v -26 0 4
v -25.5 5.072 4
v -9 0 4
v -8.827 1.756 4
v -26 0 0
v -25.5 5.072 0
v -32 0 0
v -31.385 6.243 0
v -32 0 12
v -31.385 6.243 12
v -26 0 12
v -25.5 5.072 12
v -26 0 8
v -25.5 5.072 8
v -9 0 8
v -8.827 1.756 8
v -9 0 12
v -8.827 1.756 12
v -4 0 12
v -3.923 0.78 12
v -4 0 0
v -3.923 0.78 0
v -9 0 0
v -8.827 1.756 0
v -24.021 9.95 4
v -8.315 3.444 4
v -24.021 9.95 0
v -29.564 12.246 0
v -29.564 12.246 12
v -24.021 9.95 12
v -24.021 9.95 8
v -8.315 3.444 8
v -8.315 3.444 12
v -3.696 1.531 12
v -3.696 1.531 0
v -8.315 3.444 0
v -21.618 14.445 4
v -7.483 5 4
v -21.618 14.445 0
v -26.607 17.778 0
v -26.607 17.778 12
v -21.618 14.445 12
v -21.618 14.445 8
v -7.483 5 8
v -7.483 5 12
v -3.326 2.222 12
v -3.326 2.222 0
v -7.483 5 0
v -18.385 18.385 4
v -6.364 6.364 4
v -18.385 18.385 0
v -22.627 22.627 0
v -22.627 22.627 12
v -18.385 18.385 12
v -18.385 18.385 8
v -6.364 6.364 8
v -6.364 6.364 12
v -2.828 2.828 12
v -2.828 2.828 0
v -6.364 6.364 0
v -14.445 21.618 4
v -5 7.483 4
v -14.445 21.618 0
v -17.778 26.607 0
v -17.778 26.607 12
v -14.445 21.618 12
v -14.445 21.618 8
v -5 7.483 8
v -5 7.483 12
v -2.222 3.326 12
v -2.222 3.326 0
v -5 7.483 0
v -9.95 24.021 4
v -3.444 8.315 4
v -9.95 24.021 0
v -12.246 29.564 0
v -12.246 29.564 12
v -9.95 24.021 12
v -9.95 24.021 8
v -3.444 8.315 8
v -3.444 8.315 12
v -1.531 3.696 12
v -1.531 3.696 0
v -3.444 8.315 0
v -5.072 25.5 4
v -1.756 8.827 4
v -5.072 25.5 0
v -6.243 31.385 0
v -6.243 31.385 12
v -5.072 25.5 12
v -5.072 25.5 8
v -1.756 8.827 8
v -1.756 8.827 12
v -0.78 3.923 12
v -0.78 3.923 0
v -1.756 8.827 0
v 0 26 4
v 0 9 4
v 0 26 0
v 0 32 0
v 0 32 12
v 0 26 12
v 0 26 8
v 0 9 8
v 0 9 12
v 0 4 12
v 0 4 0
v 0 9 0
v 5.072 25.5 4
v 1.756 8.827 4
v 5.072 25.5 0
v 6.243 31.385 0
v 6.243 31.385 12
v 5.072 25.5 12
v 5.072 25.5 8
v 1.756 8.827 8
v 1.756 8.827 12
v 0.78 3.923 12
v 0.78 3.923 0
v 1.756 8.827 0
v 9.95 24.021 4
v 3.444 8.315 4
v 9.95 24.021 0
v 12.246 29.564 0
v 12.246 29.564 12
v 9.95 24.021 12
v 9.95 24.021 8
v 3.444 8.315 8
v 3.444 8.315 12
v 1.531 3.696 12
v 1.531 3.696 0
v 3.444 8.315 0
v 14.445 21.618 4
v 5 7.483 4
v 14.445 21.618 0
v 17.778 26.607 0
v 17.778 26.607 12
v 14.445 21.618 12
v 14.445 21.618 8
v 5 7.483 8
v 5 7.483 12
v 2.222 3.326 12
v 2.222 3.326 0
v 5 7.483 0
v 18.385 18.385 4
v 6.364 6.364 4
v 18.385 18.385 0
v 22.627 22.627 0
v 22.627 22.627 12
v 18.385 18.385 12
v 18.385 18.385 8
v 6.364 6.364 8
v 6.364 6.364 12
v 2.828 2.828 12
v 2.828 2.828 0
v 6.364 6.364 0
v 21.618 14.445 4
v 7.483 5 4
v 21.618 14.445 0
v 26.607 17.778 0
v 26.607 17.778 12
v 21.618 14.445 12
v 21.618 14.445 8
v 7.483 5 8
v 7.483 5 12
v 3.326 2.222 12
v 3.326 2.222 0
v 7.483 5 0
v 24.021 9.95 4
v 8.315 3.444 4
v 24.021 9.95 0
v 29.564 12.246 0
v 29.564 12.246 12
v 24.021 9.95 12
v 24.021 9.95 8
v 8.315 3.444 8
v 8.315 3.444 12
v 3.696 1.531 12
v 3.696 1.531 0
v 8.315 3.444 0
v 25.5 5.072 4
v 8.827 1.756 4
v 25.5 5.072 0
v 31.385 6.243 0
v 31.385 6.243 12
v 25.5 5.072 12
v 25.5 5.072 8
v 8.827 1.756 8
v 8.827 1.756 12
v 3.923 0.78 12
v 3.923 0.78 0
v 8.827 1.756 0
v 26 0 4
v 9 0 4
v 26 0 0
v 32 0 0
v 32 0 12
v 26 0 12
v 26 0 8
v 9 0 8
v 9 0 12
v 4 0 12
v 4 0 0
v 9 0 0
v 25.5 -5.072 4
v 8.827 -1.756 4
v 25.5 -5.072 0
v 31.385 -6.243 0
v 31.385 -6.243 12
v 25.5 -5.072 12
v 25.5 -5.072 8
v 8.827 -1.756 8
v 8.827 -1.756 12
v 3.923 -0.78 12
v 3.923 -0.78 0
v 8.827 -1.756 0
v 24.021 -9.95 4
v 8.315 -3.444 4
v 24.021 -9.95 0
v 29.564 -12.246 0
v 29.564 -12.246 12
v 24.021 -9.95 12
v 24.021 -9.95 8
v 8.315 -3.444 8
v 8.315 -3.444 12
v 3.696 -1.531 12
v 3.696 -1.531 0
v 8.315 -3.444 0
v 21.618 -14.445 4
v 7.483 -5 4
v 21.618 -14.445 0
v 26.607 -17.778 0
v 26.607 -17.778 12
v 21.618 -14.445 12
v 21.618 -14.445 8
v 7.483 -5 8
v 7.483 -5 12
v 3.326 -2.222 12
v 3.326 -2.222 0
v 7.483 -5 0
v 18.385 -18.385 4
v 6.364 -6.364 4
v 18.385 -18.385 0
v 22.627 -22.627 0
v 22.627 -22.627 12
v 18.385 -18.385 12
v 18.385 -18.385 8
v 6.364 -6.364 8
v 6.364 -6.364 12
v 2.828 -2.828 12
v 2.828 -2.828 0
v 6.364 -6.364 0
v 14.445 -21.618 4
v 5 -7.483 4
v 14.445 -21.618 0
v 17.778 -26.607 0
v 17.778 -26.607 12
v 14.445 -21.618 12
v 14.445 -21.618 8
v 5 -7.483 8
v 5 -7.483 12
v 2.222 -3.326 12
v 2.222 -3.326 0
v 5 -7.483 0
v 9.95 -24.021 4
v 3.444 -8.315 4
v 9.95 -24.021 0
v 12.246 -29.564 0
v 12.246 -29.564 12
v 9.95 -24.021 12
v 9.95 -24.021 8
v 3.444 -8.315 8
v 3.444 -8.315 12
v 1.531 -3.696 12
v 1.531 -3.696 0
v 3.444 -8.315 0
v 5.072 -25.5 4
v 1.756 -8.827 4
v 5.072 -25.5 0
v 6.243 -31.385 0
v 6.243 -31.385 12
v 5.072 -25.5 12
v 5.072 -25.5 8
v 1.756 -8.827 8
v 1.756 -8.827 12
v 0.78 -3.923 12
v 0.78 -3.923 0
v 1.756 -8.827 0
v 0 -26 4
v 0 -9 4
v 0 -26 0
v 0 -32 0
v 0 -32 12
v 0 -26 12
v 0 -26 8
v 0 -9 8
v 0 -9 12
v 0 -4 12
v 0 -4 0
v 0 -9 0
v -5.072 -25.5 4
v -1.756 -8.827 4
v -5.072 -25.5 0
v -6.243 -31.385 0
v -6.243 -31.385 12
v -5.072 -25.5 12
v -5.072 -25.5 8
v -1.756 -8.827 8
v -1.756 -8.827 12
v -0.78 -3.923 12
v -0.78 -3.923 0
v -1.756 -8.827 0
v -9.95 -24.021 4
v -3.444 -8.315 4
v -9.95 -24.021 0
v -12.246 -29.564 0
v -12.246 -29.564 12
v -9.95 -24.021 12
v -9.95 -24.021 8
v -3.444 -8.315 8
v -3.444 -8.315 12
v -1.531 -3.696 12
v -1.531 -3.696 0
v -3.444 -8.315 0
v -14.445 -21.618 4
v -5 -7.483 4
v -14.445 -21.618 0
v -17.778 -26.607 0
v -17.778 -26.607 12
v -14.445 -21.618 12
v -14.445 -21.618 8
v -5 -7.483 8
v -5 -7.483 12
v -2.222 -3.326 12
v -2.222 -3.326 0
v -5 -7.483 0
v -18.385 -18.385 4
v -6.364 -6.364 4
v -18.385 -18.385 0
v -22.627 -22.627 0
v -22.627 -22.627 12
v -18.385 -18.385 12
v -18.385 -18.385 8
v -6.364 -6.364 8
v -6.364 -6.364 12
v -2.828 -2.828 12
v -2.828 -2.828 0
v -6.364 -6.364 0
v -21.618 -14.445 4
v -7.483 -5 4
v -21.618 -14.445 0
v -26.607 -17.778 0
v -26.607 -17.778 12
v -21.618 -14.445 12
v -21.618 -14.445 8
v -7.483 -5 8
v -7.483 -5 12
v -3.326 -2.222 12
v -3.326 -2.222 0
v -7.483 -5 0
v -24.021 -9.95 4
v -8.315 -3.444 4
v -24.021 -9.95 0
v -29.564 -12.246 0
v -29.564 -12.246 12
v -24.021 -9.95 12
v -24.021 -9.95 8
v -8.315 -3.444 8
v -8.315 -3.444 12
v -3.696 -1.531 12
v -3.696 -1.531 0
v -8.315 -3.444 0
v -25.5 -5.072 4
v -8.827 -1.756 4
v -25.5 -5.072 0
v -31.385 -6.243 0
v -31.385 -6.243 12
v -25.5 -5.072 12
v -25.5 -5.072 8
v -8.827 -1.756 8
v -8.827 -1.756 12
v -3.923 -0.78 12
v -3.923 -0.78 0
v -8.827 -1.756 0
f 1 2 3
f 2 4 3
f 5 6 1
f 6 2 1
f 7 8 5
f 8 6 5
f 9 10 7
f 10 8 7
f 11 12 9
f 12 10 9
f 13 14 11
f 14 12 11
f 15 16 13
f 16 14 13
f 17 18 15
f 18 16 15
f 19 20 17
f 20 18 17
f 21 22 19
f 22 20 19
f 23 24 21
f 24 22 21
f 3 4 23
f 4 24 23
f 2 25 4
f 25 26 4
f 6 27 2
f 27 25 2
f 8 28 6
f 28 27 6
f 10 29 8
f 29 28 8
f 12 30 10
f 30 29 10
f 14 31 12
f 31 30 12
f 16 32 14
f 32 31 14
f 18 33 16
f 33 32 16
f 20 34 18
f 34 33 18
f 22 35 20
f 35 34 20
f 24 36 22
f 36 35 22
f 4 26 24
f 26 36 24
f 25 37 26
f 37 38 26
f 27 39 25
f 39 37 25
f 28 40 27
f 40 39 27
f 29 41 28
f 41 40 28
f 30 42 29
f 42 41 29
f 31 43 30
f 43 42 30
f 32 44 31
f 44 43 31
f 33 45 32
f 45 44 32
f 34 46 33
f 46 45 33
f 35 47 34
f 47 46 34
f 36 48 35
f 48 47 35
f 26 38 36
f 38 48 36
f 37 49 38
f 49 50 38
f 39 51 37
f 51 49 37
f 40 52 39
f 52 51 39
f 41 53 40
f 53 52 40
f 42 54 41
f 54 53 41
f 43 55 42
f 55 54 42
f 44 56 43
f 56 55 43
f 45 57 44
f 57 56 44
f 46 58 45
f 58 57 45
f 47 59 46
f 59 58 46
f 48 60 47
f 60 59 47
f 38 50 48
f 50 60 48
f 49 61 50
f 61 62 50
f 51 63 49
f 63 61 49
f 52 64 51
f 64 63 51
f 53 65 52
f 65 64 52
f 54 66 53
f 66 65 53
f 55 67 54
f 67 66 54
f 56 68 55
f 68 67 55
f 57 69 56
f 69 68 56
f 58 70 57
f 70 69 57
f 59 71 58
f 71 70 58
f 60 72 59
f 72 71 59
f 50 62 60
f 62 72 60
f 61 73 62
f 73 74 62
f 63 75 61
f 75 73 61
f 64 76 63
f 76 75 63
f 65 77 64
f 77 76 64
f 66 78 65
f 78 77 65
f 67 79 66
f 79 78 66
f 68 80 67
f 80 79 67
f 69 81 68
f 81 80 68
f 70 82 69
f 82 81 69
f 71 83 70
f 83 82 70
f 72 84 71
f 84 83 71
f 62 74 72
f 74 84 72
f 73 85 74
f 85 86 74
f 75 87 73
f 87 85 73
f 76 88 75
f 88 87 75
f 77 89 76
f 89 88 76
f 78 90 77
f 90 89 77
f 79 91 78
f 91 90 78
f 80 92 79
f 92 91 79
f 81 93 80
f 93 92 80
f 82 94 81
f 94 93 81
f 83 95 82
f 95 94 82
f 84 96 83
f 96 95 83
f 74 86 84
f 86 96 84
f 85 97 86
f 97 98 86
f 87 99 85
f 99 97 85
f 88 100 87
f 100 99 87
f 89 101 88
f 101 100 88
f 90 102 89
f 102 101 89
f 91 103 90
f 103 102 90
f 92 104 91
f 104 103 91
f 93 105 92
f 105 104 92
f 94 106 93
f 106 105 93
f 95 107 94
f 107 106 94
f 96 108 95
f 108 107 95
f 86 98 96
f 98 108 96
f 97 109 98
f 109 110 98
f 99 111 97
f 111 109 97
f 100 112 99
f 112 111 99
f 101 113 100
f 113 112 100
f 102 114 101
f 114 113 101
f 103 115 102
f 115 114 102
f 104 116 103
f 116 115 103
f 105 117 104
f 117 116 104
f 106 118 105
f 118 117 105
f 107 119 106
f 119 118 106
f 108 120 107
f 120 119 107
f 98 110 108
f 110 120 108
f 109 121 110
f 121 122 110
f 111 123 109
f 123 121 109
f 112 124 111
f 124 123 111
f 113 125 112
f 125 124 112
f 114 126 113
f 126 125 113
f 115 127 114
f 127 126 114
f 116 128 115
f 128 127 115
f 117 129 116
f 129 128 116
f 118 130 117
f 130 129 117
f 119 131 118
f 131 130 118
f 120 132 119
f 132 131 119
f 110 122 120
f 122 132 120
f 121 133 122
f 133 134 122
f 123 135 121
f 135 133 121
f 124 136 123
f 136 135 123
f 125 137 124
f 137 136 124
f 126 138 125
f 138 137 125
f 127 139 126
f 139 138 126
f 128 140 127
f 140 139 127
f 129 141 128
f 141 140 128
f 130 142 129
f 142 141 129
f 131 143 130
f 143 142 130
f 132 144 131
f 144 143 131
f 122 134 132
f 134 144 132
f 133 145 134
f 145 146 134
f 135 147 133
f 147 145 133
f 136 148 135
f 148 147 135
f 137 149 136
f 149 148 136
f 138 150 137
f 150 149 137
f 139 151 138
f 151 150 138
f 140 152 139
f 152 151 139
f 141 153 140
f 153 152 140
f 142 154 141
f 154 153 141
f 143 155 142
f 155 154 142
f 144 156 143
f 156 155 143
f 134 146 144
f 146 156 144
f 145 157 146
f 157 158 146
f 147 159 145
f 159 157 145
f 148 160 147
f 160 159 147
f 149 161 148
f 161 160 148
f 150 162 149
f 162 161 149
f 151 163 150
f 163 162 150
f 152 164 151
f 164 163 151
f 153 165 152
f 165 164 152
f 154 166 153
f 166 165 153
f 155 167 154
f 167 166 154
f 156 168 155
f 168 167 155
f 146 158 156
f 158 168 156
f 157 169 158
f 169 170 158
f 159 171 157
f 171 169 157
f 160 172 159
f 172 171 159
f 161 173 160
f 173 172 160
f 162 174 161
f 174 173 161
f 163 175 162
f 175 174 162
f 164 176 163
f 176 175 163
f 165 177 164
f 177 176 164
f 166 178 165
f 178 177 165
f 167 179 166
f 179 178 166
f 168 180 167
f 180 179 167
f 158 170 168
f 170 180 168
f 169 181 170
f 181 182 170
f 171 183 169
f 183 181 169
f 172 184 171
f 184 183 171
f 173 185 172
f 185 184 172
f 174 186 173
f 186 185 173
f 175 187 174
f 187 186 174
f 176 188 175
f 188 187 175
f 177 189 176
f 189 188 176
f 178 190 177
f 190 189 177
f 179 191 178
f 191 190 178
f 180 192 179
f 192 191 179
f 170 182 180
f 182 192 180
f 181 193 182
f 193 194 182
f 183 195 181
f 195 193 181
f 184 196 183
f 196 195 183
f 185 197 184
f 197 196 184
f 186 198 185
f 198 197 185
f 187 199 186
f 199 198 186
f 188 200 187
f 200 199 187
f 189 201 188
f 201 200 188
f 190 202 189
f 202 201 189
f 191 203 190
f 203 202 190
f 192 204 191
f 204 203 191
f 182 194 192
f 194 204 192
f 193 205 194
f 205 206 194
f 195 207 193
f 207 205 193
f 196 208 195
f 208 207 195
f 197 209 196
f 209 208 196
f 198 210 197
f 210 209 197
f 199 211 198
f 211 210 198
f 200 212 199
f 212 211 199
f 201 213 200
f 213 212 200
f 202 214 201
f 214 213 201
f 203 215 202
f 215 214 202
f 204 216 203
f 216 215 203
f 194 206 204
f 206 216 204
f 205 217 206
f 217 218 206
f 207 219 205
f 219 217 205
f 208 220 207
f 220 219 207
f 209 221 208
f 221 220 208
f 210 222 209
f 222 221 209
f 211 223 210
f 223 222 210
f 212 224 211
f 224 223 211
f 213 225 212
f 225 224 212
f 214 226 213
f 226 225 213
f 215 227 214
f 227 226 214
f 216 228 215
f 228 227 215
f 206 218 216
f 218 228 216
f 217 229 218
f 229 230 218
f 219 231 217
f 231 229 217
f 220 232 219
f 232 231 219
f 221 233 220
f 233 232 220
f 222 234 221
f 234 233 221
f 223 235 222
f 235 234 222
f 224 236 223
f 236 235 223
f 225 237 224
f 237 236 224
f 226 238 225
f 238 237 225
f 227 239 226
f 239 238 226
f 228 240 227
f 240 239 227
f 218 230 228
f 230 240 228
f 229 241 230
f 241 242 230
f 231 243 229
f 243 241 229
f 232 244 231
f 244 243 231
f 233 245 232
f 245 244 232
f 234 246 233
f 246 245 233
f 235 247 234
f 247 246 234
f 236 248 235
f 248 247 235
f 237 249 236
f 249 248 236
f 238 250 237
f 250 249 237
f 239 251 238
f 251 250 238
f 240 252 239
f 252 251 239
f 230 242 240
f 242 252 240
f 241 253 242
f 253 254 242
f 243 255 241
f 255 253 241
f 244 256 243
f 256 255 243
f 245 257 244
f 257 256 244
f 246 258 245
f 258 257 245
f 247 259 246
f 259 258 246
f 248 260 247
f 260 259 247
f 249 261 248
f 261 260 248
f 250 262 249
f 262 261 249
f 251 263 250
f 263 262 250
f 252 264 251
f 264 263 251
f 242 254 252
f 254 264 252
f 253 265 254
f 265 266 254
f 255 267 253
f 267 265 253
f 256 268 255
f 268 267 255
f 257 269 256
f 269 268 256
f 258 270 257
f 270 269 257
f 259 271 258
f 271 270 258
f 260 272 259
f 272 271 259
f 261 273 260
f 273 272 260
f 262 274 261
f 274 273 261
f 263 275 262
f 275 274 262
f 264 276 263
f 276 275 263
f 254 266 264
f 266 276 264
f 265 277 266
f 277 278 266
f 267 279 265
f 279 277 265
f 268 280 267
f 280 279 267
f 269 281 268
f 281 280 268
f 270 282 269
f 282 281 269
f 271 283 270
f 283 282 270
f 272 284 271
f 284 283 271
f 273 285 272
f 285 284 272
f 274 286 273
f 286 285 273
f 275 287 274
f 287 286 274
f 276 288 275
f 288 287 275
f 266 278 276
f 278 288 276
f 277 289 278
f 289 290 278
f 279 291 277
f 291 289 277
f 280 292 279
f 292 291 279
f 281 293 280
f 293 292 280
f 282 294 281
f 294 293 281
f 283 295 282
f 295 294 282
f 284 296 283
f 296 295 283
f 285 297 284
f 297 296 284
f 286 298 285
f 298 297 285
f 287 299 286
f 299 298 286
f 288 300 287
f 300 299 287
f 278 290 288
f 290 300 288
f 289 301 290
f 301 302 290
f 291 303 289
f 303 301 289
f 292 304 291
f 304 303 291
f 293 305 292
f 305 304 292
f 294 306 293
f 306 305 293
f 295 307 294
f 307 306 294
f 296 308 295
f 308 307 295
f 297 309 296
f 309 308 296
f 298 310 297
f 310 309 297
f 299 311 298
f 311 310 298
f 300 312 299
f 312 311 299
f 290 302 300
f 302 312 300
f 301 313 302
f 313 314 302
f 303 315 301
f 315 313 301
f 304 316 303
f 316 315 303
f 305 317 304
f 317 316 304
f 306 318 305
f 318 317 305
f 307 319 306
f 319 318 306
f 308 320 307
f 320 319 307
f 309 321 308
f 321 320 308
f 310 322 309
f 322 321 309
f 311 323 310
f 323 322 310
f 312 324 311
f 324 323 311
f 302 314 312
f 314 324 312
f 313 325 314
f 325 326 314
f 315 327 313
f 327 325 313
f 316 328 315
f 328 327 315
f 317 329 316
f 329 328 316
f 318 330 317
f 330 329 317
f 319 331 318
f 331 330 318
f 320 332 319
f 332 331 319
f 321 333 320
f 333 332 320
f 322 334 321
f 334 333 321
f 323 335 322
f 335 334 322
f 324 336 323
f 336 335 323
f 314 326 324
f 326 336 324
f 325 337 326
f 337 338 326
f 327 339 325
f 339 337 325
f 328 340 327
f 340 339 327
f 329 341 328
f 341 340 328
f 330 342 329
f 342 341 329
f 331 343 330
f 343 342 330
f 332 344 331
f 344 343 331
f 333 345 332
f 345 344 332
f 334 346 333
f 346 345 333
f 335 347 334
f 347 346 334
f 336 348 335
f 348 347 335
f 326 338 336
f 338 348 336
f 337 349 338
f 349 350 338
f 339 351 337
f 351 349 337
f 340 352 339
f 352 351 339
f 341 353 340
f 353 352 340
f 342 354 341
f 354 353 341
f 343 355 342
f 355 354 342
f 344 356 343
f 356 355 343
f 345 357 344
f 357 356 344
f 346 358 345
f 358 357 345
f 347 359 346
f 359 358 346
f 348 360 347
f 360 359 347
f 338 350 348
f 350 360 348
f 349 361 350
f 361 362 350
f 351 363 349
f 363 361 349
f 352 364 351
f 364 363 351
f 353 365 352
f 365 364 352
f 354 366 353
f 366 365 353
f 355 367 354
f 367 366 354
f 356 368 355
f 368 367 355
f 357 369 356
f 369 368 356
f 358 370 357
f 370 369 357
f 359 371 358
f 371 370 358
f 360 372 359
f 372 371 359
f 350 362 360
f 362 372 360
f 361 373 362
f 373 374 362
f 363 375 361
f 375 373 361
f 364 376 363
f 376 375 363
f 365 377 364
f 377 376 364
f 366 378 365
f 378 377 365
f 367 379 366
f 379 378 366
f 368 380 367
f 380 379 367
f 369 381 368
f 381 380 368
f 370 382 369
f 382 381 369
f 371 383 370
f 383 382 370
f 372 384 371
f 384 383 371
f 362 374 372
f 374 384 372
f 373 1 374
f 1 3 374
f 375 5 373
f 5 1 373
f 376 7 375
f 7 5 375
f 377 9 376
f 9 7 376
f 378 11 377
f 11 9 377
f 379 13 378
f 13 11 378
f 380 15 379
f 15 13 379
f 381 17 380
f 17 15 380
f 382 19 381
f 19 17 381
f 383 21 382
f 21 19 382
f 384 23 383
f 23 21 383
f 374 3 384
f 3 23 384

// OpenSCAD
$fn = 32;

// ----------------------------------------------------------------------
// Revolved part: handwheel R32
// ----------------------------------------------------------------------

// --- parameters (mm) ---
bore_r = 4;               // bore radius
rim_r = 32;               // rim radius
rim_w = 6;                // rim axial width
rim_t = 12;               // rim diameter height
hub_r = 9;                // hub radius
web_t = 4;                // web thickness
revolve_angle = 360;      // revolve sweep, degrees

bore_d = 2 * bore_r;
rim_d = 2 * rim_r;
hub_d = 2 * hub_r;

profile = [[4, 0], [9, 0], [9, 4], [26, 4], [26, 0], [32, 0], [32, 12], [26, 12], [26, 8], [9, 8], [9, 12], [4, 12]];  // primary outline, 12 points, counter clockwise

// --- the one profile operation ---
rotate_extrude(angle = revolve_angle) polygon(points = profile);
